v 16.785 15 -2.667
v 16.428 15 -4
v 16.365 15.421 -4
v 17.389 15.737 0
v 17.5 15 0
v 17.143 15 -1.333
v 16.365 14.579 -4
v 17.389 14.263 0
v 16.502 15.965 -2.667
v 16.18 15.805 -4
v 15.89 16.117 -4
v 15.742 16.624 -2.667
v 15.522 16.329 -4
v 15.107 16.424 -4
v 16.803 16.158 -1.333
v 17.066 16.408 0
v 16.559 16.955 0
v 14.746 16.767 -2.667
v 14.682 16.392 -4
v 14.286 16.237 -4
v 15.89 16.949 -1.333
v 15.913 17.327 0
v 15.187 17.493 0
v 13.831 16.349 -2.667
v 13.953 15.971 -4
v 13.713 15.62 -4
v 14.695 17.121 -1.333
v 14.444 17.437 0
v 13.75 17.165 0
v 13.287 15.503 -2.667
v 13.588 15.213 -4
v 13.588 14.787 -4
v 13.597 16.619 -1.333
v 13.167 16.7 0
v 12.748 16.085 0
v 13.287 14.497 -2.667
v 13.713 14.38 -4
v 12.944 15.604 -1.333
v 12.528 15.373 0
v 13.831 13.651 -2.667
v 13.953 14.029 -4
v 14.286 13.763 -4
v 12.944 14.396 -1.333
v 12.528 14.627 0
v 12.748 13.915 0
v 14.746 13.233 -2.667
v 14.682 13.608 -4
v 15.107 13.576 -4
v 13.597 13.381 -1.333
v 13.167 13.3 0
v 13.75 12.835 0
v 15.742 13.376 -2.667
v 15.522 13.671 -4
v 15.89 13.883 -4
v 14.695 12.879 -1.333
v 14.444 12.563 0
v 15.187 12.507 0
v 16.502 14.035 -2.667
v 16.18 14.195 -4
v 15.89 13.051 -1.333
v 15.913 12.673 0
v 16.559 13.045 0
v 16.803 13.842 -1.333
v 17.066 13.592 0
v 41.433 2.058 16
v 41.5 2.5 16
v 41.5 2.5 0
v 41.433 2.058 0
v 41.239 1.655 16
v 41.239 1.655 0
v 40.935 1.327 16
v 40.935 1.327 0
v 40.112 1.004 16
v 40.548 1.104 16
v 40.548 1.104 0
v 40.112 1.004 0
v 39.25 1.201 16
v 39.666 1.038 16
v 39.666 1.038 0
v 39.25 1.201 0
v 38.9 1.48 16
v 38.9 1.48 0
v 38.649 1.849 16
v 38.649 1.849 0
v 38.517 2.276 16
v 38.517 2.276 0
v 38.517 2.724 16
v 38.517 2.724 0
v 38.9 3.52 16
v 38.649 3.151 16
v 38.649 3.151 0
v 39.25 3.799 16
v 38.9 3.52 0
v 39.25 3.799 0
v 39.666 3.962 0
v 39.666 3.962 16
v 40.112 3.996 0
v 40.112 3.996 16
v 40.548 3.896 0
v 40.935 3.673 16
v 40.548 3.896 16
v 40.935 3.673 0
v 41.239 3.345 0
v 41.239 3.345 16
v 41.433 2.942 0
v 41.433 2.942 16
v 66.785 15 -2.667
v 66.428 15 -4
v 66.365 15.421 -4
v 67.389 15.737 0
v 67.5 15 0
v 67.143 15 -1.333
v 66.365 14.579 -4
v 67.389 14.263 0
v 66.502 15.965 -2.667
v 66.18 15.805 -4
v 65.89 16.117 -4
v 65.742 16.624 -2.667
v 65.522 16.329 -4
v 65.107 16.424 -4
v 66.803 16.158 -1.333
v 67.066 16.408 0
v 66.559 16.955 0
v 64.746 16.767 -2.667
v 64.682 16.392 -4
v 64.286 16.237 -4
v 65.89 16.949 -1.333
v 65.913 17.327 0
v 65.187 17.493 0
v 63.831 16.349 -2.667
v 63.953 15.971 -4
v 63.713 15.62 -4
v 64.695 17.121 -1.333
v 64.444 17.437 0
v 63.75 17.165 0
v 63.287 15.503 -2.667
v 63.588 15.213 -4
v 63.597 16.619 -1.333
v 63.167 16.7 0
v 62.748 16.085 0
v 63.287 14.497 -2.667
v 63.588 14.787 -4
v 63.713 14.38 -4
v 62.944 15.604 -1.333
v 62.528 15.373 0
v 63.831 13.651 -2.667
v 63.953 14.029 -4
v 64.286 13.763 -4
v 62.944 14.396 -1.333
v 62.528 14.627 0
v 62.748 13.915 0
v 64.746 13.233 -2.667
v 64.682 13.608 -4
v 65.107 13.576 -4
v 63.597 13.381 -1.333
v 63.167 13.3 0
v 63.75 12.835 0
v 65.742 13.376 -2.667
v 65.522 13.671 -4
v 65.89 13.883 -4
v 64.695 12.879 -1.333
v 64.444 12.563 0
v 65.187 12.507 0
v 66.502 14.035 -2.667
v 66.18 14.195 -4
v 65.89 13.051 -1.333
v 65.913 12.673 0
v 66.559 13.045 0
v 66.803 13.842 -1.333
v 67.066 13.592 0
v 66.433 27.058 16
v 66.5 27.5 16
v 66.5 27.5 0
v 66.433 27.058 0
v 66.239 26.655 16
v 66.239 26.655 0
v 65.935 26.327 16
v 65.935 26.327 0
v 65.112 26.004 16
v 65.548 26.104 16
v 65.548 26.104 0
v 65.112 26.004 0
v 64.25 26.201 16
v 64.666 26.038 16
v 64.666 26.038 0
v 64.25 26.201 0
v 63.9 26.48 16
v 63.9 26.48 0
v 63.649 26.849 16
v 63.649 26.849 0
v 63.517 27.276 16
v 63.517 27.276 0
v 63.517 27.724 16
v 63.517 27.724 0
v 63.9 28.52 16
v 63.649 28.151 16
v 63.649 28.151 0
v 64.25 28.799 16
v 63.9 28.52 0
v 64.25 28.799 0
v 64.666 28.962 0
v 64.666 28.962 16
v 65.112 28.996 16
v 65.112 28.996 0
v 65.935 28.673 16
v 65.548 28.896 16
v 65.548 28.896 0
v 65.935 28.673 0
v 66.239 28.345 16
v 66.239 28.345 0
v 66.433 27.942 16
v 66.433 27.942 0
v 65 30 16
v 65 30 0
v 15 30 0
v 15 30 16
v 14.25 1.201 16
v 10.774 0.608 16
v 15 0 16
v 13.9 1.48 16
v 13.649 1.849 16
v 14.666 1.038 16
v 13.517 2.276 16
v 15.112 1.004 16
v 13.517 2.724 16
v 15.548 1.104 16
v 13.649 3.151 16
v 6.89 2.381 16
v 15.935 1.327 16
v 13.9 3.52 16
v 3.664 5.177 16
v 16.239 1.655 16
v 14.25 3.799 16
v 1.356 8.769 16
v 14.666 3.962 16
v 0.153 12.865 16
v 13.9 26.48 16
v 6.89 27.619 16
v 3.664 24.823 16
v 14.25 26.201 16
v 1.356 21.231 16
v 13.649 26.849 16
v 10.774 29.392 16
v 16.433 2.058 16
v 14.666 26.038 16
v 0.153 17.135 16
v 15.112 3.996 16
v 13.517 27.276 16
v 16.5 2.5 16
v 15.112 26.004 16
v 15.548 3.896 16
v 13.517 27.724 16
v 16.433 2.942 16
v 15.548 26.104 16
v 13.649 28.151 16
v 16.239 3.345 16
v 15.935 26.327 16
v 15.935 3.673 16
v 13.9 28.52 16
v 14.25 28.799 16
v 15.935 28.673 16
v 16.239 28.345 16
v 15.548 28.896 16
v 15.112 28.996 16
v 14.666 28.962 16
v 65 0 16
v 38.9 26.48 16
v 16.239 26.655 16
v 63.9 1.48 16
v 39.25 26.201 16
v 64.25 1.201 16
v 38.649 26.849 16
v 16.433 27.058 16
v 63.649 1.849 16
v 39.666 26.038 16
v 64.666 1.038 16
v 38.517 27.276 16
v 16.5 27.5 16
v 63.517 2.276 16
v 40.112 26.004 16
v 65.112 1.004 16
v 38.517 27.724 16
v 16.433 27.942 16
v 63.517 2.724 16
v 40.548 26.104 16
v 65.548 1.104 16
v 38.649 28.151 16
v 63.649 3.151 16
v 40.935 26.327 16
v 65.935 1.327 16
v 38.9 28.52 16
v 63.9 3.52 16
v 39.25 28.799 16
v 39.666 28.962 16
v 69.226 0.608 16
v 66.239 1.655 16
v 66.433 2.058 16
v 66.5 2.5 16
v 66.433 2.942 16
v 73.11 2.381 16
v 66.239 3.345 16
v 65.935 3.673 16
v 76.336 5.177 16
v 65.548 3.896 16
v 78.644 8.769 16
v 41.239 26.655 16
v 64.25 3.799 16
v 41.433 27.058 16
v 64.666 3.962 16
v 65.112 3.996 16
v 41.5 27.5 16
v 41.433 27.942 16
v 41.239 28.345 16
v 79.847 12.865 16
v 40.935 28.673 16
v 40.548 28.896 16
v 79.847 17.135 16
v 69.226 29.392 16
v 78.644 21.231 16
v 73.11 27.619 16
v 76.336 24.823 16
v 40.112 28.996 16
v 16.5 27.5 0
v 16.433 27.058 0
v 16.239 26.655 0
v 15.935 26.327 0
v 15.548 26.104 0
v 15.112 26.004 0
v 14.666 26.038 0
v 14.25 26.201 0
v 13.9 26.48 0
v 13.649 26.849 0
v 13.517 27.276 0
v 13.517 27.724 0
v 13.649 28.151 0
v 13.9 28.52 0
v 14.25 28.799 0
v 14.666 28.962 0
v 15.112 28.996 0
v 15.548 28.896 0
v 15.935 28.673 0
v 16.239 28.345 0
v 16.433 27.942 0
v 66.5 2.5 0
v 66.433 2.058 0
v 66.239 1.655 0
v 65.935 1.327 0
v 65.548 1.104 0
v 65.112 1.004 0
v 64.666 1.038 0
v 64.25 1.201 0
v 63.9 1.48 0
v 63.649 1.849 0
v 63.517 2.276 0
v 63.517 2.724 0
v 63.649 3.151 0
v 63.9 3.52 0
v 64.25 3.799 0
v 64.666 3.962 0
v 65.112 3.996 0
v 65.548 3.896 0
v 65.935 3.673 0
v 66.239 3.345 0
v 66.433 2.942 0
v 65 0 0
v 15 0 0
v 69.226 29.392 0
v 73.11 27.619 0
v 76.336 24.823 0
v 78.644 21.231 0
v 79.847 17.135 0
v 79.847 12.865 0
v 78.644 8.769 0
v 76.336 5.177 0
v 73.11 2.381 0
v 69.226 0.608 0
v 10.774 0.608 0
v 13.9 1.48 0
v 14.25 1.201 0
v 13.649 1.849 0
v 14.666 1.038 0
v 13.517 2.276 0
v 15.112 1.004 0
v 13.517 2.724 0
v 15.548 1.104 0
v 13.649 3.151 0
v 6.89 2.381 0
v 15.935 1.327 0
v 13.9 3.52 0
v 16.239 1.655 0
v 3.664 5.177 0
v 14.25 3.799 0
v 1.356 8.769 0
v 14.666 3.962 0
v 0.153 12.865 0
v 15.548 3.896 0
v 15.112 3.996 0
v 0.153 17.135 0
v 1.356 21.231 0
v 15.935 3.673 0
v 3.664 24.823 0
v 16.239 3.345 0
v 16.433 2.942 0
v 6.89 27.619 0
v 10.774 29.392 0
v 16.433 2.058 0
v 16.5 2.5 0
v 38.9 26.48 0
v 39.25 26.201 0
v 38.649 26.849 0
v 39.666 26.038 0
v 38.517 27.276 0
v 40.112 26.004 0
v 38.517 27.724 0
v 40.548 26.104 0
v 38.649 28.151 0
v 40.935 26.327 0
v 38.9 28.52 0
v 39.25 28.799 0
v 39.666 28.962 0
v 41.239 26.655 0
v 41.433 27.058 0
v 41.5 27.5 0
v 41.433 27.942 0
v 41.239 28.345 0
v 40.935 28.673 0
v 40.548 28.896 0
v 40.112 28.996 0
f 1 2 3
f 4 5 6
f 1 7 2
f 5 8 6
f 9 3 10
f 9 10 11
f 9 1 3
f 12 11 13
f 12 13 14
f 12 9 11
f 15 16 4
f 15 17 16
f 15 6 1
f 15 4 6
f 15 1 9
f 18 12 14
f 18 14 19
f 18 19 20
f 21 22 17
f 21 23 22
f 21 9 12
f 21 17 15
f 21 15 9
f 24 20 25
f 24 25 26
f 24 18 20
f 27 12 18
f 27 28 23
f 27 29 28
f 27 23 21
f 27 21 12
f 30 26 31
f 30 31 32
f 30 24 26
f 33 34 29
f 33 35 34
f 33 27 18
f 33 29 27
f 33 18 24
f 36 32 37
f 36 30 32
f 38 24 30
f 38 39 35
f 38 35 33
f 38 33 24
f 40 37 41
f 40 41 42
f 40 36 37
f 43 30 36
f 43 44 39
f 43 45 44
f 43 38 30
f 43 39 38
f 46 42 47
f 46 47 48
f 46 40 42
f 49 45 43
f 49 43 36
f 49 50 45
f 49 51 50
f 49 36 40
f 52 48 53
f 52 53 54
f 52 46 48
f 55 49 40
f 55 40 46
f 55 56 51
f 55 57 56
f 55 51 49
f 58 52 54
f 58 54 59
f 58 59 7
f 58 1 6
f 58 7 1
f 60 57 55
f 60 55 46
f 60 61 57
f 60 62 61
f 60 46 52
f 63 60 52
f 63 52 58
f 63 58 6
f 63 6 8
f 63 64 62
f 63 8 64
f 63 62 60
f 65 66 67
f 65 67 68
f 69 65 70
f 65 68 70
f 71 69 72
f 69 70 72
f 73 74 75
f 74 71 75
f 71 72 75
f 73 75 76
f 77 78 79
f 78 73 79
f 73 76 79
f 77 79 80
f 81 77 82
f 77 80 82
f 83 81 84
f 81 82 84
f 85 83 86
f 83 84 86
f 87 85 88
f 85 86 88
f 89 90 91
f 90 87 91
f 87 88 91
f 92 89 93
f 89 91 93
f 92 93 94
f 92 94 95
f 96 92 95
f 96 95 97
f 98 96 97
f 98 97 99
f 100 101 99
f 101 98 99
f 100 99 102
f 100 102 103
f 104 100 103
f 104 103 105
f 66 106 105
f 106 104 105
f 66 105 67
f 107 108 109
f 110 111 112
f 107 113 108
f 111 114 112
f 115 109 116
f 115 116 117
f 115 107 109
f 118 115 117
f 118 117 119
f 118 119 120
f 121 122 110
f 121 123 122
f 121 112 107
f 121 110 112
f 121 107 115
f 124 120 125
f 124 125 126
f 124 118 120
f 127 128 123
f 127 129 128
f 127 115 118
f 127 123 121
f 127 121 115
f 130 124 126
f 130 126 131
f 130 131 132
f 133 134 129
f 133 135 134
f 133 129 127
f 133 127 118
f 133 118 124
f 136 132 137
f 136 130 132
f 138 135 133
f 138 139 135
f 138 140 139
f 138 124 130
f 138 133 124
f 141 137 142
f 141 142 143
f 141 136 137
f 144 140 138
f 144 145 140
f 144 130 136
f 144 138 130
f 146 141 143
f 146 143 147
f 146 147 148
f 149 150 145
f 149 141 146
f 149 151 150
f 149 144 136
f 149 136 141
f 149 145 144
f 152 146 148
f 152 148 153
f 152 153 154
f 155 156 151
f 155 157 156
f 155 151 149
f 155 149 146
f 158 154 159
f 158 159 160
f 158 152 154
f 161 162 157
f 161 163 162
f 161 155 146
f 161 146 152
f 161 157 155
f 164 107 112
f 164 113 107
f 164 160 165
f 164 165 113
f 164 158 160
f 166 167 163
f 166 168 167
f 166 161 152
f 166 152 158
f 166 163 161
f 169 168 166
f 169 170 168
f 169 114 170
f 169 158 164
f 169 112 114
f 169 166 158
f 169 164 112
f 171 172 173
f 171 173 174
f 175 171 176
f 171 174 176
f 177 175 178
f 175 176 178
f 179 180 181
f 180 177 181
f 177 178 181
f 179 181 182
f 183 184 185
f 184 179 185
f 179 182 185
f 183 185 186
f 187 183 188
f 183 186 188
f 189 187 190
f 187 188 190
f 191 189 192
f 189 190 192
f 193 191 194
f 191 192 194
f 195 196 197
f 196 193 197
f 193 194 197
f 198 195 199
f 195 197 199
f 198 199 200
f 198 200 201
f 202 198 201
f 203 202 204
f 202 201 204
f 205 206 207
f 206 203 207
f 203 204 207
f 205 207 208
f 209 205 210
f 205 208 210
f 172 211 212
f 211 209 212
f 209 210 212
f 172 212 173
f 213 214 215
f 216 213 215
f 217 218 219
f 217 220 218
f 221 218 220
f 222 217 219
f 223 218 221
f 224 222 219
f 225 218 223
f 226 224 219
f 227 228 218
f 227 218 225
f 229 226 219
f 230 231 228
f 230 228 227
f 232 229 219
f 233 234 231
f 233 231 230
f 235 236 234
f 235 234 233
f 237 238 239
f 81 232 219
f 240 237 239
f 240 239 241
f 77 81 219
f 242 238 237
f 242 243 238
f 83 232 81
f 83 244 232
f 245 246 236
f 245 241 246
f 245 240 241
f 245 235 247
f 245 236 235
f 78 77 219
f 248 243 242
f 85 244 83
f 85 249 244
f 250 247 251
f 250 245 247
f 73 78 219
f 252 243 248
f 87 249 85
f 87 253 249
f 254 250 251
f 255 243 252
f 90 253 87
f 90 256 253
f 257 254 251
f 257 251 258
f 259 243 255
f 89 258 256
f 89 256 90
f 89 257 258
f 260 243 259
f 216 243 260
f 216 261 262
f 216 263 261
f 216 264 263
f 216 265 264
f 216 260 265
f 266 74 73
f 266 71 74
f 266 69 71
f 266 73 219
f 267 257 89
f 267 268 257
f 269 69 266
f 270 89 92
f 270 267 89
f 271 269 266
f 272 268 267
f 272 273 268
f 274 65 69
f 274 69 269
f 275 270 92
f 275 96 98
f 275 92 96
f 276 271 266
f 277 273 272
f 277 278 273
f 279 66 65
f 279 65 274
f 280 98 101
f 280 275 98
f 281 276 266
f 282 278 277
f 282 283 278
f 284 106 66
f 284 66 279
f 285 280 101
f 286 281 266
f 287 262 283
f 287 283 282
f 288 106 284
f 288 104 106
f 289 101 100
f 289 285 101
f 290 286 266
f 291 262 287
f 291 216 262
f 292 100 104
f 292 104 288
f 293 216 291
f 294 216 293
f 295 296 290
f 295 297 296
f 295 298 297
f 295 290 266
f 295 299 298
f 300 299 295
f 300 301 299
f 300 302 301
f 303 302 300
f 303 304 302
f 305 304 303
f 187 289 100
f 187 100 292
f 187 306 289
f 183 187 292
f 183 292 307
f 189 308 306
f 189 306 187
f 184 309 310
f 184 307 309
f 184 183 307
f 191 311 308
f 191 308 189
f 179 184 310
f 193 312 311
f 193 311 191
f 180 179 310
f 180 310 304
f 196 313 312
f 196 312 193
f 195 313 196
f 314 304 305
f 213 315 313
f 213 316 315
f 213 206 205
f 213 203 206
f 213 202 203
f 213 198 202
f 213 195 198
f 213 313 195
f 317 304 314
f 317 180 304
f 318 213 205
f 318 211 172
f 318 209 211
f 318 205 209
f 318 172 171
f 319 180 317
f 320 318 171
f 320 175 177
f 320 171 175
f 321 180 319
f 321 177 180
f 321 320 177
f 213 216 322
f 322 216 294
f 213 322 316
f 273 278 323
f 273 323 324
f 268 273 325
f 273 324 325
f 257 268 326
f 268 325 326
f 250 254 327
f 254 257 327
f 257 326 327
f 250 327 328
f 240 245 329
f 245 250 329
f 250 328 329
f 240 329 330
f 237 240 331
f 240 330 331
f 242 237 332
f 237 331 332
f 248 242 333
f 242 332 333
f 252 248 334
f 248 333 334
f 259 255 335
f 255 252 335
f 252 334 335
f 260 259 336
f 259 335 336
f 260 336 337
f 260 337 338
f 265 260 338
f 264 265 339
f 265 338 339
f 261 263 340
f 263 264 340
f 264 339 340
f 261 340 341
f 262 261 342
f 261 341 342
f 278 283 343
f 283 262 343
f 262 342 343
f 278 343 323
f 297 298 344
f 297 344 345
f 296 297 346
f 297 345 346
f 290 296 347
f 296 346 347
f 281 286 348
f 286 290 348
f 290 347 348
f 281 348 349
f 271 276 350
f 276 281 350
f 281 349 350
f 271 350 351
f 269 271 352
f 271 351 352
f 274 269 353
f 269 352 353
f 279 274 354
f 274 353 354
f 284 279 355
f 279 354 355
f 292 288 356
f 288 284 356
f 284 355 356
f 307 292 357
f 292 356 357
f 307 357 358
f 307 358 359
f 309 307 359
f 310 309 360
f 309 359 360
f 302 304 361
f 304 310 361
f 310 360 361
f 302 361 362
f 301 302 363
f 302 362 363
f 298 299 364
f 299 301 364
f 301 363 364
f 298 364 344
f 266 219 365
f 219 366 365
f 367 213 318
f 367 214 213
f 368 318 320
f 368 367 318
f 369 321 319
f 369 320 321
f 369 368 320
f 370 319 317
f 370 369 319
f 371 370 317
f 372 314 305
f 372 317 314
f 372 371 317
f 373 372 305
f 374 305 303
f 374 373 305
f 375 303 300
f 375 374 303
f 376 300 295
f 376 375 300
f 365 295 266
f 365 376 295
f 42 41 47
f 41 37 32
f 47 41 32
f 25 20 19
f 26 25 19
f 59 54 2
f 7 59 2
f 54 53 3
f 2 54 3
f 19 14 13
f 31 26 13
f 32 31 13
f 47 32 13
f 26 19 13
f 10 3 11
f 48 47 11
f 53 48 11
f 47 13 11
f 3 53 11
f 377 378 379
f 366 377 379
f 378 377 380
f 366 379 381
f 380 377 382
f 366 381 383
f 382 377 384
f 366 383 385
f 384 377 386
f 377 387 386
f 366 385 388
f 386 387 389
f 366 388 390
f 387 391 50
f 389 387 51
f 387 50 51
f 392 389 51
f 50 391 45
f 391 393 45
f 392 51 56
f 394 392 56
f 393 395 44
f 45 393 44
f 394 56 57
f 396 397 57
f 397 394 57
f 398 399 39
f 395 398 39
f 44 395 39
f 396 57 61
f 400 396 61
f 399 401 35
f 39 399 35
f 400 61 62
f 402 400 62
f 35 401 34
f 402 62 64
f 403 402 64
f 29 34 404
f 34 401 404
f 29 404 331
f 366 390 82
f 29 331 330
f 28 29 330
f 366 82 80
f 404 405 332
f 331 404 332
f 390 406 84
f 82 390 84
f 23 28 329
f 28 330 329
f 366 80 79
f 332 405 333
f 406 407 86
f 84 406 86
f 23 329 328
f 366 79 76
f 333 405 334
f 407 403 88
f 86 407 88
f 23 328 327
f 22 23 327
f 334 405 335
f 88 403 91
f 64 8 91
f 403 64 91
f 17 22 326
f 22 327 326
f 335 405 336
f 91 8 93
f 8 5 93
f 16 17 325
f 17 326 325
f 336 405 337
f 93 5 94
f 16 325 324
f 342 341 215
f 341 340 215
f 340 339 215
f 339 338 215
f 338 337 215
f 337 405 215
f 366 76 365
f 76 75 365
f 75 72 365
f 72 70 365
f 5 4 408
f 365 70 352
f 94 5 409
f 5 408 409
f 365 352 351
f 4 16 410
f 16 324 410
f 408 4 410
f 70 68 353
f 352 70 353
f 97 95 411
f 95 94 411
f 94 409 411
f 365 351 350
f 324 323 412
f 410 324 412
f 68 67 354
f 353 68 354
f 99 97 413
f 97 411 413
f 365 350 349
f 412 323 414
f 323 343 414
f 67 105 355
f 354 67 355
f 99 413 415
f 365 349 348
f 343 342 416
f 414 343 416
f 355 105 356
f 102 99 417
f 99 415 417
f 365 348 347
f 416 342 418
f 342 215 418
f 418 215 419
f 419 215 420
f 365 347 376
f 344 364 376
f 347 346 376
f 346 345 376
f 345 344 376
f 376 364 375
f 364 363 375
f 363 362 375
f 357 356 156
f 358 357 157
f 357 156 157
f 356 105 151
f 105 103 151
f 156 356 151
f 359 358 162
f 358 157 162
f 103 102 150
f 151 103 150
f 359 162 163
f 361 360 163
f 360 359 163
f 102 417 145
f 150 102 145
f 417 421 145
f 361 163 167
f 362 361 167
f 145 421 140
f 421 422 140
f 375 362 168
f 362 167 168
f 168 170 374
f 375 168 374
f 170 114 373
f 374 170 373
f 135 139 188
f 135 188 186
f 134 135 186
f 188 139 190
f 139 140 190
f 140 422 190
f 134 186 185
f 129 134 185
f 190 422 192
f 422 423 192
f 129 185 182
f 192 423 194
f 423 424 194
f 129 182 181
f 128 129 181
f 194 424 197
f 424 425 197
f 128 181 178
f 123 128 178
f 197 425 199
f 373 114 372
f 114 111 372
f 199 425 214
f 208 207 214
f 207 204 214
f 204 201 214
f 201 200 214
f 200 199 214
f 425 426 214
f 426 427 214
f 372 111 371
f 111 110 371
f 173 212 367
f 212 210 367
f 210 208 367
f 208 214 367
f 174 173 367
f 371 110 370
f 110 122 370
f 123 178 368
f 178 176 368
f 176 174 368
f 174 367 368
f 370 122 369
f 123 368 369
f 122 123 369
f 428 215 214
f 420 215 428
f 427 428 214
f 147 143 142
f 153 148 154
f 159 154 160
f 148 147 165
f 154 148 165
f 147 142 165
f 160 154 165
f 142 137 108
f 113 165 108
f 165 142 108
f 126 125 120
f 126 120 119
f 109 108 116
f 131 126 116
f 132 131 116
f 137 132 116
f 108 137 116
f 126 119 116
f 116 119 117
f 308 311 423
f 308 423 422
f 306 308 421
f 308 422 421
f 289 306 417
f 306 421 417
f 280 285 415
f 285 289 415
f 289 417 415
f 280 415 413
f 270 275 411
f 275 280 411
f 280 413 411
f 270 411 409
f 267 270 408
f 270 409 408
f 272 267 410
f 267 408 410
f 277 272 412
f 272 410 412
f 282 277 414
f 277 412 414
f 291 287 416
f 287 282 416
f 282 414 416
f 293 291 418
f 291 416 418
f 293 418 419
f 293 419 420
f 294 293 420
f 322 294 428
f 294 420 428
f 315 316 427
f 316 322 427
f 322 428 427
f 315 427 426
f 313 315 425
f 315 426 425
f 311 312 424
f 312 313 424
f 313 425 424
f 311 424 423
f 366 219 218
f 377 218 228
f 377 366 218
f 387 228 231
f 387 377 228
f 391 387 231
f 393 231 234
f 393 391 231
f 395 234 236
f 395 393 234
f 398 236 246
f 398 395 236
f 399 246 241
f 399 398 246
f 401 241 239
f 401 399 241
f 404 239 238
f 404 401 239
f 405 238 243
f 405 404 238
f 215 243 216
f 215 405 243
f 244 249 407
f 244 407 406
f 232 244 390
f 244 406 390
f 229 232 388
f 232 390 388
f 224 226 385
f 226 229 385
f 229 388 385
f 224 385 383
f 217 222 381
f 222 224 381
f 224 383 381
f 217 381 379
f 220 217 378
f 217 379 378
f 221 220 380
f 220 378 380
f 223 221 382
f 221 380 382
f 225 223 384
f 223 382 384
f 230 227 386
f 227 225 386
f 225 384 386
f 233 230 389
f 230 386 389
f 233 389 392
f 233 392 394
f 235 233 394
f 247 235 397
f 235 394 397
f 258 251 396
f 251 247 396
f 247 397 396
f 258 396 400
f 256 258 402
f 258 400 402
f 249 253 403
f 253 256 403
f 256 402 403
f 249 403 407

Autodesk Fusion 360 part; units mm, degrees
sketch "Sketch1" plane through (0, 0, 0) normal (0, 0, 1) x (1, 0, 0)
  line L0 (15, 0) -> (65, 0)
  line L1 (65, 30) -> (15, 30)
  arc A0 (15, 30) -> (0, 15) centre (15, 15) ccw
  arc A1 (0, 15) -> (15, 0) centre (15, 15) ccw
  arc A2 (80, 15) -> (65, 30) centre (65, 15) ccw
  arc A3 (65, 0) -> (80, 15) centre (65, 15) ccw
  line L2 (15, 15) -> (65, 15) construction
  line L3 (15, 15) -> (15, 27.5) construction
  line L4 (65, 15) -> (65, 27.5) construction
  line L5 (15, 27.5) -> (40, 27.5) construction
  circle A4 centre (15, 27.5) radius 1.5
  circle A5 centre (40, 27.5) radius 1.5
  circle A6 centre (65, 27.5) radius 1.5
  circle A7 centre (15, 2.5) radius 1.5
  circle A8 centre (40, 2.5) radius 1.5
  circle A9 centre (65, 2.5) radius 1.5
  circle A10 centre (65, 15) radius 2.5
  circle A11 centre (15, 15) radius 2.5
  point P0 (80, 0)
  point P1 (0, 30)
  dimension "d1" = 80
  dimension "d2" = 30
  dimension "d3" = 15
  dimension "d4" = 15
  dimension "d5" = 15
  dimension "d6" = 15
  dimension "d7" = 12.5
  dimension "d8" = 12.5
  dimension "d9" = 25
  dimension "d11" = 3
  dimension "d12" = 3
  dimension "d13" = 3
  dimension "d22" = 5
  dimension "d23" = 5
extrude "Extrude1" add sketch "Sketch1" along normal blind 16 contours L0 L1 A0 A1 A2 A3 | A10 | A11
shell "Shell1" thickness 2 removed faces 1 at (23.6999, 18.8266, 16)
hole "Hole1" at (65, 27.5, 0) at (40, 27.5, 0) at (15, 27.5, 0) at (15, 2.5, 0) at (40, 2.5, 0) at (65, 2.5, 0) direction (0, 0, -1) diameter 4 depth 1 tip angle 180 countersink diameter 4.4 countersink angle 90
extrude "Extrude2" add sketch "Sketch1" against normal blind 4 draft -15 contours A10 | A11
equation "d23 = d22"
